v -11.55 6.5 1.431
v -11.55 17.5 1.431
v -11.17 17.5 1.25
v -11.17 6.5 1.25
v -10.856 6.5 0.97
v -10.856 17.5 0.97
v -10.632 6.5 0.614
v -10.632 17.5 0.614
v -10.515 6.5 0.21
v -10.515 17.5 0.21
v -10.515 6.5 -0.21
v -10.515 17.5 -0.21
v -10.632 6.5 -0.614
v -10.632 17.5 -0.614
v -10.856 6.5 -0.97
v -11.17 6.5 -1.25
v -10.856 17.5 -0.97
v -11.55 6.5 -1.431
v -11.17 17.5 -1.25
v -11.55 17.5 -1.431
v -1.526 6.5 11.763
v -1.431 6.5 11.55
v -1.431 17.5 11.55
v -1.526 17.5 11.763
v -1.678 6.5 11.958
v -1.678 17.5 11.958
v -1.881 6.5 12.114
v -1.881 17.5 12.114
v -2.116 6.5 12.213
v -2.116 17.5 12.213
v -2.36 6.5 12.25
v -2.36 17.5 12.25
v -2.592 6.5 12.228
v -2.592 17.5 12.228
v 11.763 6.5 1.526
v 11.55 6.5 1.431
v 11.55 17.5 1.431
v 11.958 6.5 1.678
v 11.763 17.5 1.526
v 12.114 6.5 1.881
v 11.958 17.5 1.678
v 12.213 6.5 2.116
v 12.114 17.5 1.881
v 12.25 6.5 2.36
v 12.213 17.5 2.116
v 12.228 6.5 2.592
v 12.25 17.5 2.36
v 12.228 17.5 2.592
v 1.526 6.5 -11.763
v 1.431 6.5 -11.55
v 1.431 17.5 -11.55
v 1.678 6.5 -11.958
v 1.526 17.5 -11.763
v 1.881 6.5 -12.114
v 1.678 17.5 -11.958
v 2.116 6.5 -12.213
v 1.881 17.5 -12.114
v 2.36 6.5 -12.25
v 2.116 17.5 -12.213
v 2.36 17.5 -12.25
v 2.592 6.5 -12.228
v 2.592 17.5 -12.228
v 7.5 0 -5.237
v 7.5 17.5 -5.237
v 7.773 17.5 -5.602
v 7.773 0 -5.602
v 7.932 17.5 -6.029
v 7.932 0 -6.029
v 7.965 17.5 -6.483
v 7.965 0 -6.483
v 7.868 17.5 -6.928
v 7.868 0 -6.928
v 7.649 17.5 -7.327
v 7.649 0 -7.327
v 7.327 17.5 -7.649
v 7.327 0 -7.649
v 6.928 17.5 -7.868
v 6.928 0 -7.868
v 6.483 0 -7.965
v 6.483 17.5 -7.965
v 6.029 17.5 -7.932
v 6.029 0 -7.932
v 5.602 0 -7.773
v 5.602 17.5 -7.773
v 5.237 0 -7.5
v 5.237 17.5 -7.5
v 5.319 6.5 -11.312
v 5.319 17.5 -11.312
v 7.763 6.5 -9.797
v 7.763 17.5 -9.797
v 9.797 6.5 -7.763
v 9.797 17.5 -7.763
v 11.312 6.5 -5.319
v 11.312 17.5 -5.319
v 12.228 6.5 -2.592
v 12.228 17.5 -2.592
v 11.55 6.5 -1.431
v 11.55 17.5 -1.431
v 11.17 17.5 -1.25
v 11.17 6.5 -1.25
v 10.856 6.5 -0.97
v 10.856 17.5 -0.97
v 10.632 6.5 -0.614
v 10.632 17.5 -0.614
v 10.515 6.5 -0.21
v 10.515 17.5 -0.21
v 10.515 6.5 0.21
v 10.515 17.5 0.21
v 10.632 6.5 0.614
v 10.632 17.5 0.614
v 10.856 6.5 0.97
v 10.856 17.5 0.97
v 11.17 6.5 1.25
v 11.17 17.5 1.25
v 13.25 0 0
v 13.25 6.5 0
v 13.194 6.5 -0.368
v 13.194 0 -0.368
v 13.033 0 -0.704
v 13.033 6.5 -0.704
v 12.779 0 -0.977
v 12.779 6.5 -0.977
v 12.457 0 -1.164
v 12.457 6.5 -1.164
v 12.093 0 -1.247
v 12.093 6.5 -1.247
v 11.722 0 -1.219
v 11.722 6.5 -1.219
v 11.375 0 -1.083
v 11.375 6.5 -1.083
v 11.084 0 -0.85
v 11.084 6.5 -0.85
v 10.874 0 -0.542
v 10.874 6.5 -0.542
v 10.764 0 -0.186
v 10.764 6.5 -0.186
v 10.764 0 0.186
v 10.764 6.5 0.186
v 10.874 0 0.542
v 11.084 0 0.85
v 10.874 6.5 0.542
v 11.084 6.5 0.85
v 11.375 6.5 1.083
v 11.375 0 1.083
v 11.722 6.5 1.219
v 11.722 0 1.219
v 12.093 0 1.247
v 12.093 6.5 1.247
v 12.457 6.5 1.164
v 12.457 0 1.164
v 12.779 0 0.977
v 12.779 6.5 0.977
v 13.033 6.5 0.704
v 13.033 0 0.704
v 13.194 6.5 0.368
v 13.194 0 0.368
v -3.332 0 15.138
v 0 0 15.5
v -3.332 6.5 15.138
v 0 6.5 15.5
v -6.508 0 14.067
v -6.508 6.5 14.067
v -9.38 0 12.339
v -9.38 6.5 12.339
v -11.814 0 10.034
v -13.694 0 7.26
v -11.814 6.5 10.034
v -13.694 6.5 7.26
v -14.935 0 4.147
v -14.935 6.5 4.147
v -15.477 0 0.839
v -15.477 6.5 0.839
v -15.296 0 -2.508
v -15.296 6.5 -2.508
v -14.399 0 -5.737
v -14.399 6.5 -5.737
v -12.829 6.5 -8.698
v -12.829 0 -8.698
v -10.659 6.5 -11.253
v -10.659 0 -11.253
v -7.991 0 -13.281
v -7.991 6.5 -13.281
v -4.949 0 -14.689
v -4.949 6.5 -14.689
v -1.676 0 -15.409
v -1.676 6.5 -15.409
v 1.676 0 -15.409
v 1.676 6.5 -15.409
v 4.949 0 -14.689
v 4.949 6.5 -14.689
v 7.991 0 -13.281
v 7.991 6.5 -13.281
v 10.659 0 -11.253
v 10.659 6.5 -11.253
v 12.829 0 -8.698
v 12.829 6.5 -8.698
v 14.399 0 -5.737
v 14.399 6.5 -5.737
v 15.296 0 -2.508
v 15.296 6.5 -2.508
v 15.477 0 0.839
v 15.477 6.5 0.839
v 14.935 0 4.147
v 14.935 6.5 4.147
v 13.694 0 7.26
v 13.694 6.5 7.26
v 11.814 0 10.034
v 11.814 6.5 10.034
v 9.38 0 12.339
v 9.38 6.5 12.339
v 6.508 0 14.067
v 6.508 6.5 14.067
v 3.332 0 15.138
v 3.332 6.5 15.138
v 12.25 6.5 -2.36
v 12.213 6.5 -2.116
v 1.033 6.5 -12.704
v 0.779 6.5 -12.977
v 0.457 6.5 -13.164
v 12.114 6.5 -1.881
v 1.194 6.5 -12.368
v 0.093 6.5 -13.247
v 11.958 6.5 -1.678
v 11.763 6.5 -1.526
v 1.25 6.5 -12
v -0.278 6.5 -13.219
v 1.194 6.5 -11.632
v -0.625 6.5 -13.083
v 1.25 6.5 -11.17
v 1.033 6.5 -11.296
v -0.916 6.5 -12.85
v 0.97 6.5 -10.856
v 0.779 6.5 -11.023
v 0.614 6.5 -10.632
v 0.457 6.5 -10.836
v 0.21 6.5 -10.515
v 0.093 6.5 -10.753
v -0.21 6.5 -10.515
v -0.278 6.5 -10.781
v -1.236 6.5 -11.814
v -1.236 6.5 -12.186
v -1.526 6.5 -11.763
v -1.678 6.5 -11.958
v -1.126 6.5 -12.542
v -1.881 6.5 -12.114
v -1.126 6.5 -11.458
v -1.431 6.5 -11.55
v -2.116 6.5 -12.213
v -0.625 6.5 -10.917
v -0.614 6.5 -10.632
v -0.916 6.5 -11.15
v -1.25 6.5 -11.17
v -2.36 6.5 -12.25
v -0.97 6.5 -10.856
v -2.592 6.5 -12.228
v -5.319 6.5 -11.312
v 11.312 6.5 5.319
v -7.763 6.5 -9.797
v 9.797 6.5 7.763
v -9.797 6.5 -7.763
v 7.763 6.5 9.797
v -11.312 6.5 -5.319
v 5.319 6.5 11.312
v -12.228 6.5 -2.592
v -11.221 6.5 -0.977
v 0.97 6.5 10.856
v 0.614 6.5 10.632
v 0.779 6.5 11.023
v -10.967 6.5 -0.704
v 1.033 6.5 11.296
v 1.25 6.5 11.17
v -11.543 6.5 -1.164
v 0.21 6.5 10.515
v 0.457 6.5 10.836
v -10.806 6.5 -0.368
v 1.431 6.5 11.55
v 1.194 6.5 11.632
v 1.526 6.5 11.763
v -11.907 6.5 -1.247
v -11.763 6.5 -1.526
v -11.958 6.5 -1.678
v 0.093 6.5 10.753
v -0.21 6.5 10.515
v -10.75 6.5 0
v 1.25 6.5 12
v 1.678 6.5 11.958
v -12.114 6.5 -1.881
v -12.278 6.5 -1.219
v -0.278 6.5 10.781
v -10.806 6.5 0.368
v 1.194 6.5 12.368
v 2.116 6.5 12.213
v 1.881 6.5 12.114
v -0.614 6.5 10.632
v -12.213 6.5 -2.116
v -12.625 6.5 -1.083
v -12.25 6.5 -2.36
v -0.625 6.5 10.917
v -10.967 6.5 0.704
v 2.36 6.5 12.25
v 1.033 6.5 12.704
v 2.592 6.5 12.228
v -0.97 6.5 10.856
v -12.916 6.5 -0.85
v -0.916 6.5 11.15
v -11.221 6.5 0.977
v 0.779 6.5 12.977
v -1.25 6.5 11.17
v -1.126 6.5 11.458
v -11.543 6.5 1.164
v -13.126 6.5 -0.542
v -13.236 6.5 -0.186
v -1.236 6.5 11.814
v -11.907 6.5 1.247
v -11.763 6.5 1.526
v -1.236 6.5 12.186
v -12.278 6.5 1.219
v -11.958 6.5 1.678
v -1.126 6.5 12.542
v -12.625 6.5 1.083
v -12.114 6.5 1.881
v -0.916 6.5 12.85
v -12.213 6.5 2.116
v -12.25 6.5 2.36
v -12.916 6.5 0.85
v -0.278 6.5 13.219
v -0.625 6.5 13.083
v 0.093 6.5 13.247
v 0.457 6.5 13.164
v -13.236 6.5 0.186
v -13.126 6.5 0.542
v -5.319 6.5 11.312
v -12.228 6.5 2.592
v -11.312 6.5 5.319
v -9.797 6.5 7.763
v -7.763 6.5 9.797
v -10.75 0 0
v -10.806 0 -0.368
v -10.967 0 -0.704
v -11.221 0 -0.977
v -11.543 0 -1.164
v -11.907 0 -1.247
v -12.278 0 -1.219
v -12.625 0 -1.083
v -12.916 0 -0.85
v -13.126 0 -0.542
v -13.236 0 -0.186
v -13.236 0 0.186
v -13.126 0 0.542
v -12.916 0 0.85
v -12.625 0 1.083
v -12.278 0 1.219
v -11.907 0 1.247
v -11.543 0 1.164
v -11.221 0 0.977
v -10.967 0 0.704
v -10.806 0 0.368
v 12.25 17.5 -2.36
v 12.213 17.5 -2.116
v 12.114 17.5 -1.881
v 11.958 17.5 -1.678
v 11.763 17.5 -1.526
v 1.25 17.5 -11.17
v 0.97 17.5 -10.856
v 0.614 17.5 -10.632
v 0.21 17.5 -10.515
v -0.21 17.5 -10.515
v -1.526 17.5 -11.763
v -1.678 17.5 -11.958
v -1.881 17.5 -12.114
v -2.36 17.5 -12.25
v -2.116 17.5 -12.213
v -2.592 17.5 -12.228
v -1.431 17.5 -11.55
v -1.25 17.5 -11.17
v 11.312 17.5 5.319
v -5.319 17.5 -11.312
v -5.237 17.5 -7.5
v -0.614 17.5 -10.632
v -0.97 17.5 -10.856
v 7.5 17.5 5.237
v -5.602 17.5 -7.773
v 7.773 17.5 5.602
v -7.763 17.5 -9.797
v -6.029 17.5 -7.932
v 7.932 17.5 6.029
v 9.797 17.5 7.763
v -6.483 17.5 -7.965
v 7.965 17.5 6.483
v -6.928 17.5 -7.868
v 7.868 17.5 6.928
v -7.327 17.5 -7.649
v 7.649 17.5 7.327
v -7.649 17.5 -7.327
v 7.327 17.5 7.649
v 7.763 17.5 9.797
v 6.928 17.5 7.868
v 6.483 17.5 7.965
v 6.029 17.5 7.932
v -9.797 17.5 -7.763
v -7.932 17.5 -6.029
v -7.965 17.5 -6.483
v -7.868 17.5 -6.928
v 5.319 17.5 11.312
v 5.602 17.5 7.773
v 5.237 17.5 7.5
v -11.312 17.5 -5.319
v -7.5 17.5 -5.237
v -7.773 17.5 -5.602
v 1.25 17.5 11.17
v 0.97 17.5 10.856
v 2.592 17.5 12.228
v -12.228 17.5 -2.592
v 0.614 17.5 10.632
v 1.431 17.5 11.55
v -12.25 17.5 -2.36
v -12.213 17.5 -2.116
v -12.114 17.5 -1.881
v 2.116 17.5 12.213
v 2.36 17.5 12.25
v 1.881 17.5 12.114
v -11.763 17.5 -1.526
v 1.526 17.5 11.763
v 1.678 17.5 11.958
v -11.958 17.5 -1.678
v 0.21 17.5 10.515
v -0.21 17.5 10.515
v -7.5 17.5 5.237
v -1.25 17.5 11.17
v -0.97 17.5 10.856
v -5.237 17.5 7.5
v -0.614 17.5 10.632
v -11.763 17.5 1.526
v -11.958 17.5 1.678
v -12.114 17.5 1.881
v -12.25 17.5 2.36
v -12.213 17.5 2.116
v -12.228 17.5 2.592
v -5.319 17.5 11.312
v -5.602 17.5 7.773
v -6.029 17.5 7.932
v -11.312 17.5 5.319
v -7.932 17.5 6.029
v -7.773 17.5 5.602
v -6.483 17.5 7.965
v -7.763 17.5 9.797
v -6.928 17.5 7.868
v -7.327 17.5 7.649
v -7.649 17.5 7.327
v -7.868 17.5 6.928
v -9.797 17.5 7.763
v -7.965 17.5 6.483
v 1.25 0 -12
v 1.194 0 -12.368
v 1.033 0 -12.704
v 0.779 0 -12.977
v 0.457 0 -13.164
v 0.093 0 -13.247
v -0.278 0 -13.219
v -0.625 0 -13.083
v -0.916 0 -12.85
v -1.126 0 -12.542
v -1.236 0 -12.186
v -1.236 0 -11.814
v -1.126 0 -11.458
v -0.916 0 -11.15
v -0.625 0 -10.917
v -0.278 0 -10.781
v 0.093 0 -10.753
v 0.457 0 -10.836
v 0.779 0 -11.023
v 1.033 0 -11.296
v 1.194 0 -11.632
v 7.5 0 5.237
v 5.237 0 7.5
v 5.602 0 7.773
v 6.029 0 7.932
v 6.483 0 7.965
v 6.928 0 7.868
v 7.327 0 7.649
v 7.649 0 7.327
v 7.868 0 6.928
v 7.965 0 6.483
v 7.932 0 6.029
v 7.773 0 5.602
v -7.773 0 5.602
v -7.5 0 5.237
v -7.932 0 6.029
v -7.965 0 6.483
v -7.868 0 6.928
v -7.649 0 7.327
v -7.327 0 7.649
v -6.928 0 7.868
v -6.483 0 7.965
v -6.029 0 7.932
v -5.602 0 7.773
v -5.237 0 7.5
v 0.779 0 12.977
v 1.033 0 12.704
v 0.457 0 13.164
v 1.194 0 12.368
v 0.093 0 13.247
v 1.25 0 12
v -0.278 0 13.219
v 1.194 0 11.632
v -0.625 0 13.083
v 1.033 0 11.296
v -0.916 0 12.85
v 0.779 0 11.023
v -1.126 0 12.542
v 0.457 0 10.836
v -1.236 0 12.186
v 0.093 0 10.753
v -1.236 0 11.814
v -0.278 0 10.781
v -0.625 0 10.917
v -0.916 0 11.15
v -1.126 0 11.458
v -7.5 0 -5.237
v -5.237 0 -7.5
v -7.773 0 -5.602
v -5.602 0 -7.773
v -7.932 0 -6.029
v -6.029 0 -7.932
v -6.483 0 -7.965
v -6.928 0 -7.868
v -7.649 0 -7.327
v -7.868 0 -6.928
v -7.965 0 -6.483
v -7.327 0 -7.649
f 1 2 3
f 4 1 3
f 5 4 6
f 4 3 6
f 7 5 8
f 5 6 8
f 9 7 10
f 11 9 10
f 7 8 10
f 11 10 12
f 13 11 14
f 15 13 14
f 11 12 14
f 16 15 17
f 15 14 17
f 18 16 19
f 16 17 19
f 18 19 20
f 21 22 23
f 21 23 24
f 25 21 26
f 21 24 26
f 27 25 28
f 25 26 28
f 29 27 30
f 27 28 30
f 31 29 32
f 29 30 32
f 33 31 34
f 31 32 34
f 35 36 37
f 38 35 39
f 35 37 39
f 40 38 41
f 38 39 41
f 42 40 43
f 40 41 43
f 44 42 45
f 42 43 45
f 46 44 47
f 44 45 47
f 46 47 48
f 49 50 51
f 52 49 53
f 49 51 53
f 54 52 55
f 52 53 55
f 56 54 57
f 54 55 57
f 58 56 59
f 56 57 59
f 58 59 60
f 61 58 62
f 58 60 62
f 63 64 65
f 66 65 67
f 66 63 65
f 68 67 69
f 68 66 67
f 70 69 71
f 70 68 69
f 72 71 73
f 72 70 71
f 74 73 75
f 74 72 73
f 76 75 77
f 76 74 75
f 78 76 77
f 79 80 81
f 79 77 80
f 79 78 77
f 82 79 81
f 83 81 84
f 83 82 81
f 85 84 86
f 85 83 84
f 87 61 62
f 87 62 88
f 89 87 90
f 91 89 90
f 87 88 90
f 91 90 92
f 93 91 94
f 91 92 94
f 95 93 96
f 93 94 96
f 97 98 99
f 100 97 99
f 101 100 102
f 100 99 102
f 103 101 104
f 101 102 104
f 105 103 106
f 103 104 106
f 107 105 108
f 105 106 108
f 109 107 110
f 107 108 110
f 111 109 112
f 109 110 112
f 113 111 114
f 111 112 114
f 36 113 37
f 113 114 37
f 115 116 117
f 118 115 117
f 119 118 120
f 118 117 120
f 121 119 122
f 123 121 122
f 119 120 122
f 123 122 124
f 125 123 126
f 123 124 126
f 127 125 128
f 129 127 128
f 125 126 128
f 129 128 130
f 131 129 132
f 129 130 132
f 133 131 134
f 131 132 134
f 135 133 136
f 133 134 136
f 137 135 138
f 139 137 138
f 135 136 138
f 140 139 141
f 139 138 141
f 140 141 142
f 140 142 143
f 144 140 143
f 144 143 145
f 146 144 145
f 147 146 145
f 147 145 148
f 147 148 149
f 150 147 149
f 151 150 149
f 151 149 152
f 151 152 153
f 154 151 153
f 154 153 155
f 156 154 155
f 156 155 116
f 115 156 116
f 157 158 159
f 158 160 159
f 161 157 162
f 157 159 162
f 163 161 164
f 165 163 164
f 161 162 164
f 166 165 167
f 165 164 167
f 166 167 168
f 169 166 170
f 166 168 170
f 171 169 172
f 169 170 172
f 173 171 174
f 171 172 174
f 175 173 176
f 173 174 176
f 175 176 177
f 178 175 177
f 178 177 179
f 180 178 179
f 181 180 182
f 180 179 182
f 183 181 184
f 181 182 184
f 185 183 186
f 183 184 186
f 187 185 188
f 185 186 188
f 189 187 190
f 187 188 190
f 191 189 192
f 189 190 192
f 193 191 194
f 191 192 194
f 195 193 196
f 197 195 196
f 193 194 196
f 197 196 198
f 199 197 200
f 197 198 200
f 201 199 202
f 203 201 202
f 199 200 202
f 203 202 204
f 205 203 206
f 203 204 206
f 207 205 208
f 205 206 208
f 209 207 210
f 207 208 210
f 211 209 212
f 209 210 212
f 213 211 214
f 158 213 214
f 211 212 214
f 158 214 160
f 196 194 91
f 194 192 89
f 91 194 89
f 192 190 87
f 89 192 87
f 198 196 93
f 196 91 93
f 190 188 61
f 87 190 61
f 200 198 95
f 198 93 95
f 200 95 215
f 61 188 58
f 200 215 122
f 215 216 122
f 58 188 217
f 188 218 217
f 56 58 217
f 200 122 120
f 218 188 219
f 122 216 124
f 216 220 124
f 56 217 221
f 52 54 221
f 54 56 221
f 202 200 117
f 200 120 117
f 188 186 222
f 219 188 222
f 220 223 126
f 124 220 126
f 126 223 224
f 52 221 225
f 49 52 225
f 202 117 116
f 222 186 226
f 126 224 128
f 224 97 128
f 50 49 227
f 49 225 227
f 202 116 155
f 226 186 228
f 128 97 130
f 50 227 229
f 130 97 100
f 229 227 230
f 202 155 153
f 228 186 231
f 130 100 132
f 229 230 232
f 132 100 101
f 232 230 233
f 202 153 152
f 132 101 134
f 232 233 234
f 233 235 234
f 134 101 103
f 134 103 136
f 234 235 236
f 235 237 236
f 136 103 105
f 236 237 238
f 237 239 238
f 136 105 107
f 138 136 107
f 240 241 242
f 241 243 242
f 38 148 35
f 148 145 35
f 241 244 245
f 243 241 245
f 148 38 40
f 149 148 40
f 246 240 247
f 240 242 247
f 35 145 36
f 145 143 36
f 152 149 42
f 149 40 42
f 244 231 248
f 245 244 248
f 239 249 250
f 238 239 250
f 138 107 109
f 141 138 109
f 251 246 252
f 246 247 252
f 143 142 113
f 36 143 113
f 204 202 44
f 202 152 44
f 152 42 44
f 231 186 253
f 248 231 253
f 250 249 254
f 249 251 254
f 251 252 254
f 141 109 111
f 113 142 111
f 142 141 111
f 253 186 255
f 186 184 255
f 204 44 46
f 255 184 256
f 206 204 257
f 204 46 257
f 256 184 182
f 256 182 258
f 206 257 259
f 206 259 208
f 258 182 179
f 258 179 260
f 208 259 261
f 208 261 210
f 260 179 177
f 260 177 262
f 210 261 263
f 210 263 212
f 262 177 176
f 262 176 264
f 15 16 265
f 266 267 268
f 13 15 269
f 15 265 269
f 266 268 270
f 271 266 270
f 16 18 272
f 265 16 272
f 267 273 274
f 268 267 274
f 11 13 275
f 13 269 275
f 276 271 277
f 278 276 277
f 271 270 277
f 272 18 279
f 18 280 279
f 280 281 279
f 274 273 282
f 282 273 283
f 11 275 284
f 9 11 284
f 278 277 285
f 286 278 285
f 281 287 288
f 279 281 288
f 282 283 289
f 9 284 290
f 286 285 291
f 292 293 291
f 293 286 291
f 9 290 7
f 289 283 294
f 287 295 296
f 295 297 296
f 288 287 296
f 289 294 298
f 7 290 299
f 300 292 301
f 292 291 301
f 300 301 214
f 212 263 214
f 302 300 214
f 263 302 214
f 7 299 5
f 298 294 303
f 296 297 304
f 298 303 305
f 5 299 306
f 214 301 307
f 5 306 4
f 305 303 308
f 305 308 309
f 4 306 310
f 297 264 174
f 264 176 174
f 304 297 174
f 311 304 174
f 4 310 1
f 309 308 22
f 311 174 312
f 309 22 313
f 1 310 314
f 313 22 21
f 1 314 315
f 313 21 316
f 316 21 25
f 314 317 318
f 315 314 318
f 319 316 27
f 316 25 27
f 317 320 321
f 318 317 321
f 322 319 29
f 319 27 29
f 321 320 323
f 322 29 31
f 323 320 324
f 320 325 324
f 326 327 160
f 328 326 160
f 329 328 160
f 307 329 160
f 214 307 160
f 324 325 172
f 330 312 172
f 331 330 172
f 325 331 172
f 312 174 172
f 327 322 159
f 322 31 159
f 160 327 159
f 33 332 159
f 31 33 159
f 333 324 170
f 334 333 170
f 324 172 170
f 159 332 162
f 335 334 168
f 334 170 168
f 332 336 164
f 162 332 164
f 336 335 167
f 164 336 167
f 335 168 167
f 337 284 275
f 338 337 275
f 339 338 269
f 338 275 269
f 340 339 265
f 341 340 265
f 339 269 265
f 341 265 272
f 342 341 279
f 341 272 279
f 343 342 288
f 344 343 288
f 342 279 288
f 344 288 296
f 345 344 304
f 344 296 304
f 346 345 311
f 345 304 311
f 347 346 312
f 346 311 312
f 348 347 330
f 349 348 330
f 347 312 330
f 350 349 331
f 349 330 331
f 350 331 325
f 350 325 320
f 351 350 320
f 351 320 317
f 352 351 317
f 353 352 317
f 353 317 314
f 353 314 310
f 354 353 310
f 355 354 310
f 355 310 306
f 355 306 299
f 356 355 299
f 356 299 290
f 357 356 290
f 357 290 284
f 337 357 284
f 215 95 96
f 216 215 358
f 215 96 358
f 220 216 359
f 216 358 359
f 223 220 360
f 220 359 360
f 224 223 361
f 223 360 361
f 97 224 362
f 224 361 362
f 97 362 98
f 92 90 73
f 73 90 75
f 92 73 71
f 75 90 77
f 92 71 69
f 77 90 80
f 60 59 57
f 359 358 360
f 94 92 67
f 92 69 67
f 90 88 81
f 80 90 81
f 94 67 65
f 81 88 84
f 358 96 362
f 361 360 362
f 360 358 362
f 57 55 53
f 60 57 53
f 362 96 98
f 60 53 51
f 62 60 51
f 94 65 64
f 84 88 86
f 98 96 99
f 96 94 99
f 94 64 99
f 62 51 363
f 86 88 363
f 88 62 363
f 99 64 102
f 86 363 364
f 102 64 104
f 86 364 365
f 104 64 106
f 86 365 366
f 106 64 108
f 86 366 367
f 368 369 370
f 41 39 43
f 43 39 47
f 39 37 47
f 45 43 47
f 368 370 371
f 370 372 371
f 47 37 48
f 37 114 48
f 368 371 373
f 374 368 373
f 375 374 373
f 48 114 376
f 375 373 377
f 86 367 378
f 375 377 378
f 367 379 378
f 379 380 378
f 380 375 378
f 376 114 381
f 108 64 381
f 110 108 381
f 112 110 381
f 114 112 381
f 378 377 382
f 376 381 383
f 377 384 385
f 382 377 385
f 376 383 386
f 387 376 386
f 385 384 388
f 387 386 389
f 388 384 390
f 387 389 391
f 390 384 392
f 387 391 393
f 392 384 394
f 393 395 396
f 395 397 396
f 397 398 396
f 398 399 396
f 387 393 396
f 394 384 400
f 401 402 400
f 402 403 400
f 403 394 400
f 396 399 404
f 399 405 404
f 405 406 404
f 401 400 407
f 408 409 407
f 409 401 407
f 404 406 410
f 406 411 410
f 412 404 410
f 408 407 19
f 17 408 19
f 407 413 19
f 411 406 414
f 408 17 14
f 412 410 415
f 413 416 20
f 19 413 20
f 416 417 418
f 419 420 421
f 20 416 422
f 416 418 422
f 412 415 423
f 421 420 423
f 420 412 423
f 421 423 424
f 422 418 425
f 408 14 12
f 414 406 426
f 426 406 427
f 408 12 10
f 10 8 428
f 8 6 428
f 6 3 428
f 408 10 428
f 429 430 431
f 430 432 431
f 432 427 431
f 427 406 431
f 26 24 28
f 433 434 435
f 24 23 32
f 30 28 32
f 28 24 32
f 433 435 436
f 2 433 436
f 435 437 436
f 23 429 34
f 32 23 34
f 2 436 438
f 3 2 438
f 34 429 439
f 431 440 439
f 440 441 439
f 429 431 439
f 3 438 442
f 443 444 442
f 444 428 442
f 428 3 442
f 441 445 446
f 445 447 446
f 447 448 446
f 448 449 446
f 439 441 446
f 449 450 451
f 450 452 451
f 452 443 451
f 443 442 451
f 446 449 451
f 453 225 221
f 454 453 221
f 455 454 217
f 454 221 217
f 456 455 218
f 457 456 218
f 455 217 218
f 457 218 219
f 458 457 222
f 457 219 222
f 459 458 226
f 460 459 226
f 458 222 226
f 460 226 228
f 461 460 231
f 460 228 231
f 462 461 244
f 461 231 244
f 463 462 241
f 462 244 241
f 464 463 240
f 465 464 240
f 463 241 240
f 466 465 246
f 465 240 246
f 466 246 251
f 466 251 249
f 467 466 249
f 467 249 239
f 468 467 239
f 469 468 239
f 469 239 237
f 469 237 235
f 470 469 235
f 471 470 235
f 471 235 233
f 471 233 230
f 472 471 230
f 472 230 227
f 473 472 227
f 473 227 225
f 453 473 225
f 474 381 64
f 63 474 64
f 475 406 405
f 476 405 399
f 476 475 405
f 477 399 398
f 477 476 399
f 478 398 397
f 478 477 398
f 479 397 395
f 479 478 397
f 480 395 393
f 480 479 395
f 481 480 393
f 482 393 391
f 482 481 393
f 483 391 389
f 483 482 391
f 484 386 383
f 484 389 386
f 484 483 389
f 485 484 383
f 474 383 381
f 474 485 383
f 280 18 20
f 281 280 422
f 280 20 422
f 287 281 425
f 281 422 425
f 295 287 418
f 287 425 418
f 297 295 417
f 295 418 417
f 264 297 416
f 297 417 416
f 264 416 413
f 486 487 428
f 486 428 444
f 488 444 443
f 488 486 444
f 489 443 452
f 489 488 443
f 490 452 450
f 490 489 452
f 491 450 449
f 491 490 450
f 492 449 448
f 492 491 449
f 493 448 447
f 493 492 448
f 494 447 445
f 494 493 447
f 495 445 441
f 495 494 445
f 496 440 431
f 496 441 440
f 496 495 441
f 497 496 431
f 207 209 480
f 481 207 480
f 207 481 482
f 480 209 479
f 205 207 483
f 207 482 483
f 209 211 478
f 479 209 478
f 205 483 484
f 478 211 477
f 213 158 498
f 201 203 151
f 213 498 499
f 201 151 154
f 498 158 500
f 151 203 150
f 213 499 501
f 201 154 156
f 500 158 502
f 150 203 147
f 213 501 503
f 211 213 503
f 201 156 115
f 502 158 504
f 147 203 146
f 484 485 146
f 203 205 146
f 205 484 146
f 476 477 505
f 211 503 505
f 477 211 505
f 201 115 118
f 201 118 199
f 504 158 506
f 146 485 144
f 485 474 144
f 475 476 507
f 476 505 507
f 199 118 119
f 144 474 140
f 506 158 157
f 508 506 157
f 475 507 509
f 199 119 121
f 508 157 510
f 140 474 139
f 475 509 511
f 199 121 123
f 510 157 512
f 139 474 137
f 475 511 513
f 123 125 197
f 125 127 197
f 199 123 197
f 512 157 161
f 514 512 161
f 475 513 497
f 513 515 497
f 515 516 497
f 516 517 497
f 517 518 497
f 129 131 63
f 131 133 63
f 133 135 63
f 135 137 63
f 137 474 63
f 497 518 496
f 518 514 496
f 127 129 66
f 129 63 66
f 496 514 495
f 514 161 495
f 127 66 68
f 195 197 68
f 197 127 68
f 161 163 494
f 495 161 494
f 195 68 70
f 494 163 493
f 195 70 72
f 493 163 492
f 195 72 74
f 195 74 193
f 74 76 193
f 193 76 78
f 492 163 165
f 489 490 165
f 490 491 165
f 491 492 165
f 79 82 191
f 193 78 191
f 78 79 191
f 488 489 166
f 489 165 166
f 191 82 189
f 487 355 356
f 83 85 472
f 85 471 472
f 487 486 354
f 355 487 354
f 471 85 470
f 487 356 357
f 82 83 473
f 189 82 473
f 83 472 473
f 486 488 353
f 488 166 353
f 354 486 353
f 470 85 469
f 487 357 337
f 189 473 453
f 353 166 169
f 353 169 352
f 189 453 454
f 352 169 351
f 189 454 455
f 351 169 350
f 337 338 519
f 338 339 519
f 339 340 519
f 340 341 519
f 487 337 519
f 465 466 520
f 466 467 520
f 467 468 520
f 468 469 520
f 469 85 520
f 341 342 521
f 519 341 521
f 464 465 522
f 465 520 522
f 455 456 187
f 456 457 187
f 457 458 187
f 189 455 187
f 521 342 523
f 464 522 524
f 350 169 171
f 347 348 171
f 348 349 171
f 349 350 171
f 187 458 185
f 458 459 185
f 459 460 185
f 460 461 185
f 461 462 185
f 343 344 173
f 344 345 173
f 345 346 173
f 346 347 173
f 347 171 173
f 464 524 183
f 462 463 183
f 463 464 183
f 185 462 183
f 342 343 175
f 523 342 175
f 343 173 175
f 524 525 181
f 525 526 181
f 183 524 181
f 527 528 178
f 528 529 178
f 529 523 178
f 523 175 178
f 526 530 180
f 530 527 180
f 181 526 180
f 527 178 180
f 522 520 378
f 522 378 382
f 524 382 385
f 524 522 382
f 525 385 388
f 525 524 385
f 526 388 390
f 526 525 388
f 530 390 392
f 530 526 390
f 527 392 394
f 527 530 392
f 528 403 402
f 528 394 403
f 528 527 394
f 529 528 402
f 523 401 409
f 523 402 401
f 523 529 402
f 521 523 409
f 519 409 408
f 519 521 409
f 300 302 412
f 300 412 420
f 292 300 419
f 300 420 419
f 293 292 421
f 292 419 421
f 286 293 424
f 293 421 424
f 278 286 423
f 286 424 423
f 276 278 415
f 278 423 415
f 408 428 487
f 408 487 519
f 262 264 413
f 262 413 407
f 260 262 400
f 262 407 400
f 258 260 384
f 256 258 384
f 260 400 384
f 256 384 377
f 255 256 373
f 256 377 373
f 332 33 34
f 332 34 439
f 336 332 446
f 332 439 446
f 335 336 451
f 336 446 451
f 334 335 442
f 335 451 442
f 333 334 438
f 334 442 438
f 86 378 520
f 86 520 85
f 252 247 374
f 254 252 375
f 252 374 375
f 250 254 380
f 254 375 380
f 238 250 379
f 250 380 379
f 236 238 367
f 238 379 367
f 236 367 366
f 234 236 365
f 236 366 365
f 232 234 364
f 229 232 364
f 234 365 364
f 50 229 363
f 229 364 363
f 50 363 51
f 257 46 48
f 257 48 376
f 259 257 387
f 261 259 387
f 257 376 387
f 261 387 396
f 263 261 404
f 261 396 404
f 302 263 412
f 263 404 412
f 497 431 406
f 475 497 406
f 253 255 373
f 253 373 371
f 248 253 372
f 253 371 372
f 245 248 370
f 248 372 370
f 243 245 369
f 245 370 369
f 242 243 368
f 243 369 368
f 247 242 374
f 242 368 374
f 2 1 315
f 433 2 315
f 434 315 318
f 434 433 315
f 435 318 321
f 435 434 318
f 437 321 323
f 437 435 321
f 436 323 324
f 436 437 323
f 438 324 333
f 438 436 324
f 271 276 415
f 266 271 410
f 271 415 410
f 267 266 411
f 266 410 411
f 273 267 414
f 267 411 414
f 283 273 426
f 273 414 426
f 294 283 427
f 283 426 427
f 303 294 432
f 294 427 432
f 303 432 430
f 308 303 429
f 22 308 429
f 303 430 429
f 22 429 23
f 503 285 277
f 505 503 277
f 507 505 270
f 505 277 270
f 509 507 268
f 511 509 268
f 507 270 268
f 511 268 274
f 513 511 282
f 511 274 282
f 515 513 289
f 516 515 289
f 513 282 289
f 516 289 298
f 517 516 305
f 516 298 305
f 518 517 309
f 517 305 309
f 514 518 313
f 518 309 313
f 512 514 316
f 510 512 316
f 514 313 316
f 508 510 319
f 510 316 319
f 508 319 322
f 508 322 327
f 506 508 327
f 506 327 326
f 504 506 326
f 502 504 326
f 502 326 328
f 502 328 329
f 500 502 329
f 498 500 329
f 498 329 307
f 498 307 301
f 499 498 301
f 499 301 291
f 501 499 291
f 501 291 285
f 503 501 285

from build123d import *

# Parameters (mm, degrees)
SKETCH_2_R          = 1.6
SKETCH_2_W          = 15
SKETCH_2_H          = 15
CUT_EXTRUDE_1_DEPTH = 29.049064156
HOLE_WIZARD_M3_1_D  = 2.5
SKETCH_6_R          = 1.5
CUT_EXTRUDE_2_DEPTH = 11
FILLET_1_R          = 1


with BuildPart() as part:
    # 草图1 → 旋转1 (revolve)
    with BuildSketch(Plane(origin=(0, 0, 0), x_dir=(0, 0, -1), z_dir=(1, 0, 0)), mode=Mode.PRIVATE) as revolve_1_sk:
        Polygon((0, 0), (15.5, 0), (15.5, 6.5), (12.5, 6.5), (12.5, 17.5), (0, 17.5), align=None)
    revolve(revolve_1_sk.sketch.rotate(Axis((0, 25.607258106, 0), (0, -1, 0)), 180), axis=Axis((0, 25.607258106, 0), (0, -1, 0)))

    # 草图2 → 切除-拉伸1 (cut, through all)
    with BuildSketch(Plane(origin=(0, 0, 0), x_dir=(1, 0, 0), z_dir=(0, 1, 0))):
        with Locations((6.36862915, 6.36862915)):
            Circle(SKETCH_2_R)
        with Locations((-6.36862915, 6.36862915)):
            Circle(SKETCH_2_R)
        with Locations((-6.36862915, -6.36862915)):
            Circle(SKETCH_2_R)
        with Locations((6.36862915, -6.36862915)):
            Circle(SKETCH_2_R)
        Rectangle(SKETCH_2_W, SKETCH_2_H)
    extrude(amount=CUT_EXTRUDE_1_DEPTH, mode=Mode.SUBTRACT)

    # M3 螺纹孔1 (through all)
    with Locations(Plane(origin=(0, 0, 0), x_dir=(-1, 0, 0), z_dir=(0, -1, 0))):
        with Locations((12, 0), (0, 12), (-12, 0), (0, -12)):
            Hole(HOLE_WIZARD_M3_1_D / 2)

    # 草图6 → 切除-拉伸2 (cut)
    with BuildSketch(Plane(origin=(0, 17.5, 0), x_dir=(1, 0, 0), z_dir=(0, 1, 0))):
        with Locations((-12, 0)):
            Circle(SKETCH_6_R)
        with Locations((0, 12)):
            Circle(SKETCH_6_R)
        with Locations((12, 0)):
            Circle(SKETCH_6_R)
        with Locations((0, -12)):
            Circle(SKETCH_6_R)
    extrude(amount=-CUT_EXTRUDE_2_DEPTH, mode=Mode.SUBTRACT)

    # 圆角1
    fillet_1_edges = [part.edges().sort_by_distance(p)[0] for p in [
        (-12.416666667, 12, 1.440968039),
        (-12.416666667, 12, -1.440968039),
        (-1.440968039, 12, -12.416666667),
        (1.440968039, 12, -12.416666667),
        (12.416666667, 12, -1.440968039),
        (12.416666667, 12, 1.440968039),
        (-1.440968039, 12, 12.416666667),
        (1.440968039, 12, 12.416666667),
    ]]
    fillet(fillet_1_edges, radius=FILLET_1_R)


solid = part.part
